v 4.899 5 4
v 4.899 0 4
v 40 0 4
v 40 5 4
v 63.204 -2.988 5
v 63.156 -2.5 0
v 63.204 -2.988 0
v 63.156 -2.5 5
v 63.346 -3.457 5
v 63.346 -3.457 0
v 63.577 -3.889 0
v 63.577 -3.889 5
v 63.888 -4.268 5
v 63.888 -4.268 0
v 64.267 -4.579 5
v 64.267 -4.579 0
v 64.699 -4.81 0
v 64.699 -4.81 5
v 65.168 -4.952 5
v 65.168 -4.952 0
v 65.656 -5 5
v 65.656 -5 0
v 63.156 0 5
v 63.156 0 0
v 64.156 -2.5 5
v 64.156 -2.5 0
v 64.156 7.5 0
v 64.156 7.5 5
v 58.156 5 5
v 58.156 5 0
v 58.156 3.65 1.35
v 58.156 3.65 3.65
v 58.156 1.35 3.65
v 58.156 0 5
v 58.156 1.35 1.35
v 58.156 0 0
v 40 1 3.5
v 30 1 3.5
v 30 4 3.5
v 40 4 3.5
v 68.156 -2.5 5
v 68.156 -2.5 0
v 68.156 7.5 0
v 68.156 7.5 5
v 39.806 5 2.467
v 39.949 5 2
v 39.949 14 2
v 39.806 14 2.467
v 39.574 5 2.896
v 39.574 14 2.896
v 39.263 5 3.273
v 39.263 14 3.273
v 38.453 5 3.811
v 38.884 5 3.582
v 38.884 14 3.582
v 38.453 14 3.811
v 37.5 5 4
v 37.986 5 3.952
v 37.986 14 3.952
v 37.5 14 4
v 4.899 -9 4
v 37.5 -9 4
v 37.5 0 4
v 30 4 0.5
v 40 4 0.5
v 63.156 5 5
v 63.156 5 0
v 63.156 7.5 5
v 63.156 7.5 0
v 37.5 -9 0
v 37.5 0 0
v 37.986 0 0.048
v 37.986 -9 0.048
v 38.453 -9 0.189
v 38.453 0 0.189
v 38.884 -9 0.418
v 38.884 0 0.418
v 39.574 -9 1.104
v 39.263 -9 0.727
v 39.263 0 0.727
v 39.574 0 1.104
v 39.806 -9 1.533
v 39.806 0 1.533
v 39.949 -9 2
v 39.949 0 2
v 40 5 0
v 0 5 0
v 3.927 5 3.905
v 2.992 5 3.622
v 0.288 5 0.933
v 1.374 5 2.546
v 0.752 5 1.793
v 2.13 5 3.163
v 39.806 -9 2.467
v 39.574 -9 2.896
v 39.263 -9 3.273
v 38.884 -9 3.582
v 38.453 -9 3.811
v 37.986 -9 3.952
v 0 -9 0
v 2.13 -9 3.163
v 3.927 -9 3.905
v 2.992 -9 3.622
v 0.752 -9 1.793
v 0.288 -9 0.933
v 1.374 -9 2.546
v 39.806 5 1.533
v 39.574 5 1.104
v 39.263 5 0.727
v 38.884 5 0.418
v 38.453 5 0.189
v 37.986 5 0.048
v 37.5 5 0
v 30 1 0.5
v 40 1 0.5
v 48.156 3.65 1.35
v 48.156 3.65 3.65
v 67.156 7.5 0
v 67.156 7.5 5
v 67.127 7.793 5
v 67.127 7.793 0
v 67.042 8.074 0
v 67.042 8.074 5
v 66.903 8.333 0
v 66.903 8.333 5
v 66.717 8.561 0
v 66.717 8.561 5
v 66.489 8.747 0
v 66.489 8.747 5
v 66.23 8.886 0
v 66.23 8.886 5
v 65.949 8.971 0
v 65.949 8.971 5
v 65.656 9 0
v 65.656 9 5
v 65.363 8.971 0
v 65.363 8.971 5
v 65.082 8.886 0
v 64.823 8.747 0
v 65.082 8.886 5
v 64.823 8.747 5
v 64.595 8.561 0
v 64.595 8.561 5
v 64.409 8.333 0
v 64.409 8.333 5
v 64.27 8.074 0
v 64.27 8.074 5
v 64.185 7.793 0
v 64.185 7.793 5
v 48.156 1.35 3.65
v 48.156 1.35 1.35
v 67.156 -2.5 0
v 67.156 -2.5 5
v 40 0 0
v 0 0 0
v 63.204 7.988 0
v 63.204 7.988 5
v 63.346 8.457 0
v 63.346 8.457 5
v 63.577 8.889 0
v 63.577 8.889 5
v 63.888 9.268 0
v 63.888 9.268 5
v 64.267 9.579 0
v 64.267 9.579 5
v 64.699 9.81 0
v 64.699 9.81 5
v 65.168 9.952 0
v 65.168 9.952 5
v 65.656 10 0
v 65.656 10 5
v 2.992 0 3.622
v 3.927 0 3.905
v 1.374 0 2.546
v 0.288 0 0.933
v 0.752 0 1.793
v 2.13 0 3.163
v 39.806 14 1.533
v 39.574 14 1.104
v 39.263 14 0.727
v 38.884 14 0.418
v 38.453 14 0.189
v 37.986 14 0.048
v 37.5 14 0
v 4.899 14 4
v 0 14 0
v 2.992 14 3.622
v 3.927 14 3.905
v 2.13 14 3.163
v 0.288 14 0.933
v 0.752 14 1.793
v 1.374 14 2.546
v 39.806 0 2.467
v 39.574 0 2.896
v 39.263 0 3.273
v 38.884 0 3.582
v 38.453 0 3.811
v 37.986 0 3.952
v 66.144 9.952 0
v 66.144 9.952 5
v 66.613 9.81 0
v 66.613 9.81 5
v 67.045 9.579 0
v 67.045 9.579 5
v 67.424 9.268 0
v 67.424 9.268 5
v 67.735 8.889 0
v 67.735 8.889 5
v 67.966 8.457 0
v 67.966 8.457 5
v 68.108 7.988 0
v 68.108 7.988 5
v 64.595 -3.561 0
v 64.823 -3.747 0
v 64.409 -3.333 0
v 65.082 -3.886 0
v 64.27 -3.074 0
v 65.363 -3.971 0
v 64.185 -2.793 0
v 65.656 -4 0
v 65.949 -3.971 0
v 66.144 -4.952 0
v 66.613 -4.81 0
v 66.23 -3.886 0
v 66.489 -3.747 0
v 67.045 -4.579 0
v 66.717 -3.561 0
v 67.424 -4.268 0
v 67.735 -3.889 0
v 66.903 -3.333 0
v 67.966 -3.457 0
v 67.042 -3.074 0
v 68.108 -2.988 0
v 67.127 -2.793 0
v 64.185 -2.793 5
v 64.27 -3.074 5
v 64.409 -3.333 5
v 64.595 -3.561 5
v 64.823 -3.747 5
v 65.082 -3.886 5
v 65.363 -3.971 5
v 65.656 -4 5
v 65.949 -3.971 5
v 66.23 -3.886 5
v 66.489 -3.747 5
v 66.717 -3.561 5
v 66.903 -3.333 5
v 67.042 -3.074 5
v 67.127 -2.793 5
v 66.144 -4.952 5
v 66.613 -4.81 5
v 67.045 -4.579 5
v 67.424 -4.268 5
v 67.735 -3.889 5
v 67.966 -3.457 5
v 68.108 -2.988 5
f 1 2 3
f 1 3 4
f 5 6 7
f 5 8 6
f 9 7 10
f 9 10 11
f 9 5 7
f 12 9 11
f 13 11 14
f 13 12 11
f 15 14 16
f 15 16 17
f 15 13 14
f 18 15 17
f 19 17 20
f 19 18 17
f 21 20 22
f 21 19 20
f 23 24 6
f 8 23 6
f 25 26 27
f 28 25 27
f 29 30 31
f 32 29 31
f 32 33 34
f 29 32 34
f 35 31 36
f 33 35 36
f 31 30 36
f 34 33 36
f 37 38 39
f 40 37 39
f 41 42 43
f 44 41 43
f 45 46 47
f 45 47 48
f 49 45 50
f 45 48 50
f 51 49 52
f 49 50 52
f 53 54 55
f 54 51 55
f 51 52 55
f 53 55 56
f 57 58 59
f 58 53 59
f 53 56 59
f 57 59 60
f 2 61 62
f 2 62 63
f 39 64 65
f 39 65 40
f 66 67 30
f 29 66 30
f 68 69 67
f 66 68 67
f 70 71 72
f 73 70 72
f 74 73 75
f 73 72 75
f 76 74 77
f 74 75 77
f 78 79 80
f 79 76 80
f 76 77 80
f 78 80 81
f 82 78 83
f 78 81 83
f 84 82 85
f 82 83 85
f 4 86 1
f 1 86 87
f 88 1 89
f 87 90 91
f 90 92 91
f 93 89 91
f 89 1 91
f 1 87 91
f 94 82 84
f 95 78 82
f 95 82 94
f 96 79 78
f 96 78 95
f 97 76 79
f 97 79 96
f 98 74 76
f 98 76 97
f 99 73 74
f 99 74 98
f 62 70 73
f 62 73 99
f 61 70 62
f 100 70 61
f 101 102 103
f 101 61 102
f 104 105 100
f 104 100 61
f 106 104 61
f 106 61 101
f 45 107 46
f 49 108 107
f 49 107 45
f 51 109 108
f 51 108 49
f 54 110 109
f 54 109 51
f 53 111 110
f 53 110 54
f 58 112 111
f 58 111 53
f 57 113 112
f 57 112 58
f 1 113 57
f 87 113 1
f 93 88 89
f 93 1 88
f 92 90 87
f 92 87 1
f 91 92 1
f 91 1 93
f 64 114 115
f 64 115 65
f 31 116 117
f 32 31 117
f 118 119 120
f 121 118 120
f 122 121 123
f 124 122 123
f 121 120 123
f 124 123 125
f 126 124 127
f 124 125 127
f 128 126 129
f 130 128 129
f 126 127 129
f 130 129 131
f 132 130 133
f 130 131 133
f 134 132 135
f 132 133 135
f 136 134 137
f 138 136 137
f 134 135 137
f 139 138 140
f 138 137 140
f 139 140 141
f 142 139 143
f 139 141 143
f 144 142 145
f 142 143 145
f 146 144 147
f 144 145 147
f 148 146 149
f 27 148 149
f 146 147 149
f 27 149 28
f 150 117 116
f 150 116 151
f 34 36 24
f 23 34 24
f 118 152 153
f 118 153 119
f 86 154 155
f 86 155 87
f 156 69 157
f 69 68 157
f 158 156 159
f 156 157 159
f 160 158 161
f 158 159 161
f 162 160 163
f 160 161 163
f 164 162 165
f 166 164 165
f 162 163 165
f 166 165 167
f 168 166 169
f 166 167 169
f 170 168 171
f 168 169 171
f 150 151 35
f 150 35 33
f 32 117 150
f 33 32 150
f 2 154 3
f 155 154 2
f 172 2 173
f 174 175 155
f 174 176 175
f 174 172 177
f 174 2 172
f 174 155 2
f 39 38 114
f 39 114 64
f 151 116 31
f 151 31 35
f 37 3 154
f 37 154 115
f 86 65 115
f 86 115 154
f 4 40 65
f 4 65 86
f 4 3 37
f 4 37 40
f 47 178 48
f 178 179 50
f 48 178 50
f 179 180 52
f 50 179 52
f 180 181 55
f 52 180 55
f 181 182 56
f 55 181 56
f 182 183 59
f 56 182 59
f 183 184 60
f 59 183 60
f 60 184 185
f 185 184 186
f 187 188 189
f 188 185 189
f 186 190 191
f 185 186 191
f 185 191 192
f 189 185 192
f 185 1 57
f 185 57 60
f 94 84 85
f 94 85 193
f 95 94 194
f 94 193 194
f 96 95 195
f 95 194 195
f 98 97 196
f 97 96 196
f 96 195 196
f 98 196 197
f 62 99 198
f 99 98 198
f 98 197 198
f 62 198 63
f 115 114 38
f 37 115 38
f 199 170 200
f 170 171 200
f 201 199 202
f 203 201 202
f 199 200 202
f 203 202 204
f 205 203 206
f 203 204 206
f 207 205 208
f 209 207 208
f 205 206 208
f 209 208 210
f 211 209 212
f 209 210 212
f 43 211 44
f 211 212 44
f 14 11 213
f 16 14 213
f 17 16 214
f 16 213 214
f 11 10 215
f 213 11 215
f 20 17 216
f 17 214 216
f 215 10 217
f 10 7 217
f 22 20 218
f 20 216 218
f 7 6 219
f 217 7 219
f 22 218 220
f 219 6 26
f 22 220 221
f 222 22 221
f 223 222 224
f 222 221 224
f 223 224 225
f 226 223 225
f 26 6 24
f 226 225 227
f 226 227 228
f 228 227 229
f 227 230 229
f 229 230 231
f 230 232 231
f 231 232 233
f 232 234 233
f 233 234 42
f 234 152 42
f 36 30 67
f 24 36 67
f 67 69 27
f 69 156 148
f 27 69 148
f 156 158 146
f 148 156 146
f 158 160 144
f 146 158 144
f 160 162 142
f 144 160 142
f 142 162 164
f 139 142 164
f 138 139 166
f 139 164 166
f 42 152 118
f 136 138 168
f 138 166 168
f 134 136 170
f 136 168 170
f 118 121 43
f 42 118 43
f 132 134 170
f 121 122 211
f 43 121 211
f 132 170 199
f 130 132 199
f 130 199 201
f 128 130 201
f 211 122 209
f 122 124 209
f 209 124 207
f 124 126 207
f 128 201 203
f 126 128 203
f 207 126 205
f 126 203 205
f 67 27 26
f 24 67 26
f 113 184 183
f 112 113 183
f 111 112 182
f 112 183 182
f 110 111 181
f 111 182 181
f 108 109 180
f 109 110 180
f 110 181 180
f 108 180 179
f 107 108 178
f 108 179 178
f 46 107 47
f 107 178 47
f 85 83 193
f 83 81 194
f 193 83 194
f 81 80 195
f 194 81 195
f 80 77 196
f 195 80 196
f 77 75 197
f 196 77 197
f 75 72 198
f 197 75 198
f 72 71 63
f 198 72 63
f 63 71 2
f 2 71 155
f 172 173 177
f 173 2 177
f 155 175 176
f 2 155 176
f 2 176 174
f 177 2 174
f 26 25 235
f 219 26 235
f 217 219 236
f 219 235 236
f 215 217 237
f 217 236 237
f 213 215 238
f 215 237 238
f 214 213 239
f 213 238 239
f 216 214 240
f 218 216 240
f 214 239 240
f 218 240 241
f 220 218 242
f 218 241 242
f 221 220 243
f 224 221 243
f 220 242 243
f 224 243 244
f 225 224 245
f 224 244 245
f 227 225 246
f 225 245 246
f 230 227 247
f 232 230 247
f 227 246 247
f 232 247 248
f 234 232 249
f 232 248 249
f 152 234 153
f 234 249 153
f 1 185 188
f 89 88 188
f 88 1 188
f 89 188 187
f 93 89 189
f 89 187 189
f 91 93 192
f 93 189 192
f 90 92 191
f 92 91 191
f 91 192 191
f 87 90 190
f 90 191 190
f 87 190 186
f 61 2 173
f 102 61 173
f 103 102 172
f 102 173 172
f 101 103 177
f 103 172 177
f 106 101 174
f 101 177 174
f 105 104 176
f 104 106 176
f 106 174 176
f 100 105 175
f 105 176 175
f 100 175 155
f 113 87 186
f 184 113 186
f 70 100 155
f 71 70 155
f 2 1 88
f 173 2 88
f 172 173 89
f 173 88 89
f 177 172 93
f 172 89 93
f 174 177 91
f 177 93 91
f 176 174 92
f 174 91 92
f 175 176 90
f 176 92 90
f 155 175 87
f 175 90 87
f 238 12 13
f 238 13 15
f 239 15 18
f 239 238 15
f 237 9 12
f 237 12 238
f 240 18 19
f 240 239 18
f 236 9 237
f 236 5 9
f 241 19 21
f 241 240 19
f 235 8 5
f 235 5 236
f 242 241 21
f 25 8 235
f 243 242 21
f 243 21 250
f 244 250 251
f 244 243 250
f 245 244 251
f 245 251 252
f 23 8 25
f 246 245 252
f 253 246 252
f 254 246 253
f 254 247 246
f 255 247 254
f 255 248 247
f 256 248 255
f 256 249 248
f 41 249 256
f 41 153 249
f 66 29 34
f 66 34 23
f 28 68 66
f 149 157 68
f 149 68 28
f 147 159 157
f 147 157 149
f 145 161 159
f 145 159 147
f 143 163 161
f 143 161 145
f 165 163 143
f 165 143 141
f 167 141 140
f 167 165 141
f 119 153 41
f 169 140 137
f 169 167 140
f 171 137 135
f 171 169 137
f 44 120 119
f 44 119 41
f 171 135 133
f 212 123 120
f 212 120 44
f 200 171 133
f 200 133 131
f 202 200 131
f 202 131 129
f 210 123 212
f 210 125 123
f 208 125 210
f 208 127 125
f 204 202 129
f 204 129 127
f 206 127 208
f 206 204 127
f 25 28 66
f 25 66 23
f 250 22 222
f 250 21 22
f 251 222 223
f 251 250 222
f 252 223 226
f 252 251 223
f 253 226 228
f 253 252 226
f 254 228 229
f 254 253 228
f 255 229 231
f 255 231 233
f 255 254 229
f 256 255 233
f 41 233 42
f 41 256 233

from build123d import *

# Parameters (mm, degrees)
F0_W          = 9
F0_H          = 4
F1_DEPTH      = 40
F0_W_2        = 5
F2_DEPTH      = 40
F3_W          = 3
F3_H          = 3
F4_DEPTH      = 10
F5_T1_DEPTH   = 33.4948974279
F5_2_T1_DEPTH = 33.4948974279
F5_3_T1_DEPTH = 29.4948974279
F6_T1_DEPTH   = 21.5
F6_2_T1_DEPTH = 21.5
F7_W          = 1
F7_H          = 10
F8_DEPTH      = 5
F9_D          = 3
F10_W         = 2.3
F10_H         = 2.3
F11_DEPTH     = 10
F12_R         = 2.49999


# Not quite as in the source:
# - a fillet or chamfer that OpenCascade refuses, or shapes differently, is made with other operations: its cross-section is extruded or revolved along the edge and cut away or added
# - a fillet or chamfer is up to 0.001 mm smaller than in the source, because OpenCascade refuses the exact size


with BuildPart() as f1:
    # F0 (on Right) → F1 (new body)
    with BuildSketch(Plane.YZ):
        with Locations((-4.5, 2)):
            Rectangle(F0_W, F0_H)
    extrude(amount=F1_DEPTH)

    # F5: fillet of radius 5 on 1 edges, made by hand

    # F5_s2 → F5_t1 (cut)
    with BuildSketch(Plane.XZ.offset(-12.2474487139)):
        with BuildLine():
            ThreePointArc((4.8989794856, 4), (1.7367018254, 2.8729833462), (0, 0))
            Line((0, 0), (0, 4))
            Line((0, 4), (4.8989794856, 4))
        make_face()
    extrude(amount=F5_T1_DEPTH, mode=Mode.SUBTRACT)

    # F6: fillet of radius 2.5 on 2 edges, made by hand

    # F6_s2 → F6_t1 (cut)
    with BuildSketch(Plane.XZ.offset(-6.25)):
        with BuildLine():
            ThreePointArc((40, 1.5), (39.267766953, 3.267766953), (37.5, 4))
            Line((37.5, 4), (40, 4))
            Line((40, 4), (40, 1.5))
        make_face()
        with BuildLine():
            ThreePointArc((37.5, 0), (39.267766953, 0.732233047), (40, 2.5))
            Line((40, 2.5), (40, 0))
            Line((40, 0), (37.5, 0))
        make_face()
    extrude(amount=F6_T1_DEPTH, mode=Mode.SUBTRACT)


with BuildPart() as f1b:
    # F0 (on Right) → F1, piece 2 (new body)
    with BuildSketch(Plane.YZ):
        with Locations((9.5, 2)):
            Rectangle(F0_W, F0_H)
    extrude(amount=F1_DEPTH)

    # F5#2: fillet of radius 5 on 1 edges, made by hand

    # F5_2_s2 → F5_2_t1 (cut)
    with BuildSketch(Plane.XZ.offset(-26.2474487139)):
        with BuildLine():
            ThreePointArc((4.8989794856, 4), (1.7367018254, 2.8729833462), (0, 0))
            Line((0, 0), (0, 4))
            Line((0, 4), (4.8989794856, 4))
        make_face()
    extrude(amount=F5_2_T1_DEPTH, mode=Mode.SUBTRACT)

    # F6#2: fillet of radius 2.5 on 2 edges, made by hand

    # F6_2_s2 → F6_2_t1 (cut)
    with BuildSketch(Plane.XZ.offset(-20.25)):
        with BuildLine():
            ThreePointArc((40, 1.5), (39.267766953, 3.267766953), (37.5, 4))
            Line((37.5, 4), (40, 4))
            Line((40, 4), (40, 1.5))
        make_face()
        with BuildLine():
            ThreePointArc((37.5, 0), (39.267766953, 0.732233047), (40, 2.5))
            Line((40, 2.5), (40, 0))
            Line((40, 0), (37.5, 0))
        make_face()
    extrude(amount=F6_2_T1_DEPTH, mode=Mode.SUBTRACT)


with BuildPart() as f2:
    # F0 (on Right) → F2 (new body)
    with BuildSketch(Plane.YZ):
        with Locations((2.5, 2)):
            Rectangle(F0_W_2, F0_H)
    extrude(amount=F2_DEPTH)

    # F3 (on face) → F4 (cut)
    with BuildSketch(Plane.YZ.offset(40)):
        with Locations((2.5, 2)):
            Rectangle(F3_W, F3_H)
    extrude(amount=-F4_DEPTH, mode=Mode.SUBTRACT)

    # F5#3: fillet of radius 5 on 1 edges, made by hand

    # F5_3_s2 → F5_3_t1 (cut)
    with BuildSketch(Plane.XZ.offset(-17.2474487139)):
        with BuildLine():
            ThreePointArc((4.8989794856, 4), (1.7367018254, 2.8729833462), (0, 0))
            Line((0, 0), (0, 4))
            Line((0, 4), (4.8989794856, 4))
        make_face()
    extrude(amount=F5_3_T1_DEPTH, mode=Mode.SUBTRACT)


with BuildPart() as f8:
    # F7 (on Top) → F8 (new body)
    with BuildSketch(Plane.XY):
        Polygon((58.1561289728, 5), (58.1561289728, 0), (63.1561289728, 0), (63.1561289728, -2.5), (64.1561289728, -2.5), (64.1561289728, 7.5), (63.1561289728, 7.5), (63.1561289728, 5), align=None)
        Polygon((64.1561289728, -2.5), (63.1561289728, -2.5), (63.1561289728, -5), (68.1561289728, -5), (68.1561289728, -2.5), (67.1561289728, -2.5), align=None)
        Polygon((63.1561289728, 10), (63.1561289728, 7.5), (64.1561289728, 7.5), (67.1561289728, 7.5), (68.1561289728, 7.5), (68.1561289728, 10), align=None)
        with Locations((67.6561289728, 2.5)):
            Rectangle(F7_W, F7_H)
    extrude(amount=F8_DEPTH)

    # F9 (through all)
    with Locations(Plane(origin=(0, 0, 0), x_dir=(1, 0, 0), z_dir=(0, 0, -1))):
        with Locations((65.6561289728, -7.5), (65.6561289728, 2.5)):
            Hole(F9_D / 2)

    # F10 (on face) → F11 (join)
    with BuildSketch(Plane(origin=(58.1561289728, 0, 0), x_dir=(0, -1, 0), z_dir=(-1, 0, 0))):
        with Locations((-2.5, 2.5)):
            Rectangle(F10_W, F10_H)
    extrude(amount=F11_DEPTH)

    # F12 (radius 2.5 in the source; OpenCascade refuses exactly that, so slightly less here)
    f12_edges = [f8.edges().sort_by_distance(p)[0] for p in [
        (68.156129, 10, 2.5),
        (63.156129, 10, 2.5),
        (68.156129, -5, 2.5),
        (63.156129, -5, 2.5),
    ]]
    fillet(f12_edges, radius=F12_R)


solid = Compound([f1.part, f1b.part, f2.part, f8.part])
